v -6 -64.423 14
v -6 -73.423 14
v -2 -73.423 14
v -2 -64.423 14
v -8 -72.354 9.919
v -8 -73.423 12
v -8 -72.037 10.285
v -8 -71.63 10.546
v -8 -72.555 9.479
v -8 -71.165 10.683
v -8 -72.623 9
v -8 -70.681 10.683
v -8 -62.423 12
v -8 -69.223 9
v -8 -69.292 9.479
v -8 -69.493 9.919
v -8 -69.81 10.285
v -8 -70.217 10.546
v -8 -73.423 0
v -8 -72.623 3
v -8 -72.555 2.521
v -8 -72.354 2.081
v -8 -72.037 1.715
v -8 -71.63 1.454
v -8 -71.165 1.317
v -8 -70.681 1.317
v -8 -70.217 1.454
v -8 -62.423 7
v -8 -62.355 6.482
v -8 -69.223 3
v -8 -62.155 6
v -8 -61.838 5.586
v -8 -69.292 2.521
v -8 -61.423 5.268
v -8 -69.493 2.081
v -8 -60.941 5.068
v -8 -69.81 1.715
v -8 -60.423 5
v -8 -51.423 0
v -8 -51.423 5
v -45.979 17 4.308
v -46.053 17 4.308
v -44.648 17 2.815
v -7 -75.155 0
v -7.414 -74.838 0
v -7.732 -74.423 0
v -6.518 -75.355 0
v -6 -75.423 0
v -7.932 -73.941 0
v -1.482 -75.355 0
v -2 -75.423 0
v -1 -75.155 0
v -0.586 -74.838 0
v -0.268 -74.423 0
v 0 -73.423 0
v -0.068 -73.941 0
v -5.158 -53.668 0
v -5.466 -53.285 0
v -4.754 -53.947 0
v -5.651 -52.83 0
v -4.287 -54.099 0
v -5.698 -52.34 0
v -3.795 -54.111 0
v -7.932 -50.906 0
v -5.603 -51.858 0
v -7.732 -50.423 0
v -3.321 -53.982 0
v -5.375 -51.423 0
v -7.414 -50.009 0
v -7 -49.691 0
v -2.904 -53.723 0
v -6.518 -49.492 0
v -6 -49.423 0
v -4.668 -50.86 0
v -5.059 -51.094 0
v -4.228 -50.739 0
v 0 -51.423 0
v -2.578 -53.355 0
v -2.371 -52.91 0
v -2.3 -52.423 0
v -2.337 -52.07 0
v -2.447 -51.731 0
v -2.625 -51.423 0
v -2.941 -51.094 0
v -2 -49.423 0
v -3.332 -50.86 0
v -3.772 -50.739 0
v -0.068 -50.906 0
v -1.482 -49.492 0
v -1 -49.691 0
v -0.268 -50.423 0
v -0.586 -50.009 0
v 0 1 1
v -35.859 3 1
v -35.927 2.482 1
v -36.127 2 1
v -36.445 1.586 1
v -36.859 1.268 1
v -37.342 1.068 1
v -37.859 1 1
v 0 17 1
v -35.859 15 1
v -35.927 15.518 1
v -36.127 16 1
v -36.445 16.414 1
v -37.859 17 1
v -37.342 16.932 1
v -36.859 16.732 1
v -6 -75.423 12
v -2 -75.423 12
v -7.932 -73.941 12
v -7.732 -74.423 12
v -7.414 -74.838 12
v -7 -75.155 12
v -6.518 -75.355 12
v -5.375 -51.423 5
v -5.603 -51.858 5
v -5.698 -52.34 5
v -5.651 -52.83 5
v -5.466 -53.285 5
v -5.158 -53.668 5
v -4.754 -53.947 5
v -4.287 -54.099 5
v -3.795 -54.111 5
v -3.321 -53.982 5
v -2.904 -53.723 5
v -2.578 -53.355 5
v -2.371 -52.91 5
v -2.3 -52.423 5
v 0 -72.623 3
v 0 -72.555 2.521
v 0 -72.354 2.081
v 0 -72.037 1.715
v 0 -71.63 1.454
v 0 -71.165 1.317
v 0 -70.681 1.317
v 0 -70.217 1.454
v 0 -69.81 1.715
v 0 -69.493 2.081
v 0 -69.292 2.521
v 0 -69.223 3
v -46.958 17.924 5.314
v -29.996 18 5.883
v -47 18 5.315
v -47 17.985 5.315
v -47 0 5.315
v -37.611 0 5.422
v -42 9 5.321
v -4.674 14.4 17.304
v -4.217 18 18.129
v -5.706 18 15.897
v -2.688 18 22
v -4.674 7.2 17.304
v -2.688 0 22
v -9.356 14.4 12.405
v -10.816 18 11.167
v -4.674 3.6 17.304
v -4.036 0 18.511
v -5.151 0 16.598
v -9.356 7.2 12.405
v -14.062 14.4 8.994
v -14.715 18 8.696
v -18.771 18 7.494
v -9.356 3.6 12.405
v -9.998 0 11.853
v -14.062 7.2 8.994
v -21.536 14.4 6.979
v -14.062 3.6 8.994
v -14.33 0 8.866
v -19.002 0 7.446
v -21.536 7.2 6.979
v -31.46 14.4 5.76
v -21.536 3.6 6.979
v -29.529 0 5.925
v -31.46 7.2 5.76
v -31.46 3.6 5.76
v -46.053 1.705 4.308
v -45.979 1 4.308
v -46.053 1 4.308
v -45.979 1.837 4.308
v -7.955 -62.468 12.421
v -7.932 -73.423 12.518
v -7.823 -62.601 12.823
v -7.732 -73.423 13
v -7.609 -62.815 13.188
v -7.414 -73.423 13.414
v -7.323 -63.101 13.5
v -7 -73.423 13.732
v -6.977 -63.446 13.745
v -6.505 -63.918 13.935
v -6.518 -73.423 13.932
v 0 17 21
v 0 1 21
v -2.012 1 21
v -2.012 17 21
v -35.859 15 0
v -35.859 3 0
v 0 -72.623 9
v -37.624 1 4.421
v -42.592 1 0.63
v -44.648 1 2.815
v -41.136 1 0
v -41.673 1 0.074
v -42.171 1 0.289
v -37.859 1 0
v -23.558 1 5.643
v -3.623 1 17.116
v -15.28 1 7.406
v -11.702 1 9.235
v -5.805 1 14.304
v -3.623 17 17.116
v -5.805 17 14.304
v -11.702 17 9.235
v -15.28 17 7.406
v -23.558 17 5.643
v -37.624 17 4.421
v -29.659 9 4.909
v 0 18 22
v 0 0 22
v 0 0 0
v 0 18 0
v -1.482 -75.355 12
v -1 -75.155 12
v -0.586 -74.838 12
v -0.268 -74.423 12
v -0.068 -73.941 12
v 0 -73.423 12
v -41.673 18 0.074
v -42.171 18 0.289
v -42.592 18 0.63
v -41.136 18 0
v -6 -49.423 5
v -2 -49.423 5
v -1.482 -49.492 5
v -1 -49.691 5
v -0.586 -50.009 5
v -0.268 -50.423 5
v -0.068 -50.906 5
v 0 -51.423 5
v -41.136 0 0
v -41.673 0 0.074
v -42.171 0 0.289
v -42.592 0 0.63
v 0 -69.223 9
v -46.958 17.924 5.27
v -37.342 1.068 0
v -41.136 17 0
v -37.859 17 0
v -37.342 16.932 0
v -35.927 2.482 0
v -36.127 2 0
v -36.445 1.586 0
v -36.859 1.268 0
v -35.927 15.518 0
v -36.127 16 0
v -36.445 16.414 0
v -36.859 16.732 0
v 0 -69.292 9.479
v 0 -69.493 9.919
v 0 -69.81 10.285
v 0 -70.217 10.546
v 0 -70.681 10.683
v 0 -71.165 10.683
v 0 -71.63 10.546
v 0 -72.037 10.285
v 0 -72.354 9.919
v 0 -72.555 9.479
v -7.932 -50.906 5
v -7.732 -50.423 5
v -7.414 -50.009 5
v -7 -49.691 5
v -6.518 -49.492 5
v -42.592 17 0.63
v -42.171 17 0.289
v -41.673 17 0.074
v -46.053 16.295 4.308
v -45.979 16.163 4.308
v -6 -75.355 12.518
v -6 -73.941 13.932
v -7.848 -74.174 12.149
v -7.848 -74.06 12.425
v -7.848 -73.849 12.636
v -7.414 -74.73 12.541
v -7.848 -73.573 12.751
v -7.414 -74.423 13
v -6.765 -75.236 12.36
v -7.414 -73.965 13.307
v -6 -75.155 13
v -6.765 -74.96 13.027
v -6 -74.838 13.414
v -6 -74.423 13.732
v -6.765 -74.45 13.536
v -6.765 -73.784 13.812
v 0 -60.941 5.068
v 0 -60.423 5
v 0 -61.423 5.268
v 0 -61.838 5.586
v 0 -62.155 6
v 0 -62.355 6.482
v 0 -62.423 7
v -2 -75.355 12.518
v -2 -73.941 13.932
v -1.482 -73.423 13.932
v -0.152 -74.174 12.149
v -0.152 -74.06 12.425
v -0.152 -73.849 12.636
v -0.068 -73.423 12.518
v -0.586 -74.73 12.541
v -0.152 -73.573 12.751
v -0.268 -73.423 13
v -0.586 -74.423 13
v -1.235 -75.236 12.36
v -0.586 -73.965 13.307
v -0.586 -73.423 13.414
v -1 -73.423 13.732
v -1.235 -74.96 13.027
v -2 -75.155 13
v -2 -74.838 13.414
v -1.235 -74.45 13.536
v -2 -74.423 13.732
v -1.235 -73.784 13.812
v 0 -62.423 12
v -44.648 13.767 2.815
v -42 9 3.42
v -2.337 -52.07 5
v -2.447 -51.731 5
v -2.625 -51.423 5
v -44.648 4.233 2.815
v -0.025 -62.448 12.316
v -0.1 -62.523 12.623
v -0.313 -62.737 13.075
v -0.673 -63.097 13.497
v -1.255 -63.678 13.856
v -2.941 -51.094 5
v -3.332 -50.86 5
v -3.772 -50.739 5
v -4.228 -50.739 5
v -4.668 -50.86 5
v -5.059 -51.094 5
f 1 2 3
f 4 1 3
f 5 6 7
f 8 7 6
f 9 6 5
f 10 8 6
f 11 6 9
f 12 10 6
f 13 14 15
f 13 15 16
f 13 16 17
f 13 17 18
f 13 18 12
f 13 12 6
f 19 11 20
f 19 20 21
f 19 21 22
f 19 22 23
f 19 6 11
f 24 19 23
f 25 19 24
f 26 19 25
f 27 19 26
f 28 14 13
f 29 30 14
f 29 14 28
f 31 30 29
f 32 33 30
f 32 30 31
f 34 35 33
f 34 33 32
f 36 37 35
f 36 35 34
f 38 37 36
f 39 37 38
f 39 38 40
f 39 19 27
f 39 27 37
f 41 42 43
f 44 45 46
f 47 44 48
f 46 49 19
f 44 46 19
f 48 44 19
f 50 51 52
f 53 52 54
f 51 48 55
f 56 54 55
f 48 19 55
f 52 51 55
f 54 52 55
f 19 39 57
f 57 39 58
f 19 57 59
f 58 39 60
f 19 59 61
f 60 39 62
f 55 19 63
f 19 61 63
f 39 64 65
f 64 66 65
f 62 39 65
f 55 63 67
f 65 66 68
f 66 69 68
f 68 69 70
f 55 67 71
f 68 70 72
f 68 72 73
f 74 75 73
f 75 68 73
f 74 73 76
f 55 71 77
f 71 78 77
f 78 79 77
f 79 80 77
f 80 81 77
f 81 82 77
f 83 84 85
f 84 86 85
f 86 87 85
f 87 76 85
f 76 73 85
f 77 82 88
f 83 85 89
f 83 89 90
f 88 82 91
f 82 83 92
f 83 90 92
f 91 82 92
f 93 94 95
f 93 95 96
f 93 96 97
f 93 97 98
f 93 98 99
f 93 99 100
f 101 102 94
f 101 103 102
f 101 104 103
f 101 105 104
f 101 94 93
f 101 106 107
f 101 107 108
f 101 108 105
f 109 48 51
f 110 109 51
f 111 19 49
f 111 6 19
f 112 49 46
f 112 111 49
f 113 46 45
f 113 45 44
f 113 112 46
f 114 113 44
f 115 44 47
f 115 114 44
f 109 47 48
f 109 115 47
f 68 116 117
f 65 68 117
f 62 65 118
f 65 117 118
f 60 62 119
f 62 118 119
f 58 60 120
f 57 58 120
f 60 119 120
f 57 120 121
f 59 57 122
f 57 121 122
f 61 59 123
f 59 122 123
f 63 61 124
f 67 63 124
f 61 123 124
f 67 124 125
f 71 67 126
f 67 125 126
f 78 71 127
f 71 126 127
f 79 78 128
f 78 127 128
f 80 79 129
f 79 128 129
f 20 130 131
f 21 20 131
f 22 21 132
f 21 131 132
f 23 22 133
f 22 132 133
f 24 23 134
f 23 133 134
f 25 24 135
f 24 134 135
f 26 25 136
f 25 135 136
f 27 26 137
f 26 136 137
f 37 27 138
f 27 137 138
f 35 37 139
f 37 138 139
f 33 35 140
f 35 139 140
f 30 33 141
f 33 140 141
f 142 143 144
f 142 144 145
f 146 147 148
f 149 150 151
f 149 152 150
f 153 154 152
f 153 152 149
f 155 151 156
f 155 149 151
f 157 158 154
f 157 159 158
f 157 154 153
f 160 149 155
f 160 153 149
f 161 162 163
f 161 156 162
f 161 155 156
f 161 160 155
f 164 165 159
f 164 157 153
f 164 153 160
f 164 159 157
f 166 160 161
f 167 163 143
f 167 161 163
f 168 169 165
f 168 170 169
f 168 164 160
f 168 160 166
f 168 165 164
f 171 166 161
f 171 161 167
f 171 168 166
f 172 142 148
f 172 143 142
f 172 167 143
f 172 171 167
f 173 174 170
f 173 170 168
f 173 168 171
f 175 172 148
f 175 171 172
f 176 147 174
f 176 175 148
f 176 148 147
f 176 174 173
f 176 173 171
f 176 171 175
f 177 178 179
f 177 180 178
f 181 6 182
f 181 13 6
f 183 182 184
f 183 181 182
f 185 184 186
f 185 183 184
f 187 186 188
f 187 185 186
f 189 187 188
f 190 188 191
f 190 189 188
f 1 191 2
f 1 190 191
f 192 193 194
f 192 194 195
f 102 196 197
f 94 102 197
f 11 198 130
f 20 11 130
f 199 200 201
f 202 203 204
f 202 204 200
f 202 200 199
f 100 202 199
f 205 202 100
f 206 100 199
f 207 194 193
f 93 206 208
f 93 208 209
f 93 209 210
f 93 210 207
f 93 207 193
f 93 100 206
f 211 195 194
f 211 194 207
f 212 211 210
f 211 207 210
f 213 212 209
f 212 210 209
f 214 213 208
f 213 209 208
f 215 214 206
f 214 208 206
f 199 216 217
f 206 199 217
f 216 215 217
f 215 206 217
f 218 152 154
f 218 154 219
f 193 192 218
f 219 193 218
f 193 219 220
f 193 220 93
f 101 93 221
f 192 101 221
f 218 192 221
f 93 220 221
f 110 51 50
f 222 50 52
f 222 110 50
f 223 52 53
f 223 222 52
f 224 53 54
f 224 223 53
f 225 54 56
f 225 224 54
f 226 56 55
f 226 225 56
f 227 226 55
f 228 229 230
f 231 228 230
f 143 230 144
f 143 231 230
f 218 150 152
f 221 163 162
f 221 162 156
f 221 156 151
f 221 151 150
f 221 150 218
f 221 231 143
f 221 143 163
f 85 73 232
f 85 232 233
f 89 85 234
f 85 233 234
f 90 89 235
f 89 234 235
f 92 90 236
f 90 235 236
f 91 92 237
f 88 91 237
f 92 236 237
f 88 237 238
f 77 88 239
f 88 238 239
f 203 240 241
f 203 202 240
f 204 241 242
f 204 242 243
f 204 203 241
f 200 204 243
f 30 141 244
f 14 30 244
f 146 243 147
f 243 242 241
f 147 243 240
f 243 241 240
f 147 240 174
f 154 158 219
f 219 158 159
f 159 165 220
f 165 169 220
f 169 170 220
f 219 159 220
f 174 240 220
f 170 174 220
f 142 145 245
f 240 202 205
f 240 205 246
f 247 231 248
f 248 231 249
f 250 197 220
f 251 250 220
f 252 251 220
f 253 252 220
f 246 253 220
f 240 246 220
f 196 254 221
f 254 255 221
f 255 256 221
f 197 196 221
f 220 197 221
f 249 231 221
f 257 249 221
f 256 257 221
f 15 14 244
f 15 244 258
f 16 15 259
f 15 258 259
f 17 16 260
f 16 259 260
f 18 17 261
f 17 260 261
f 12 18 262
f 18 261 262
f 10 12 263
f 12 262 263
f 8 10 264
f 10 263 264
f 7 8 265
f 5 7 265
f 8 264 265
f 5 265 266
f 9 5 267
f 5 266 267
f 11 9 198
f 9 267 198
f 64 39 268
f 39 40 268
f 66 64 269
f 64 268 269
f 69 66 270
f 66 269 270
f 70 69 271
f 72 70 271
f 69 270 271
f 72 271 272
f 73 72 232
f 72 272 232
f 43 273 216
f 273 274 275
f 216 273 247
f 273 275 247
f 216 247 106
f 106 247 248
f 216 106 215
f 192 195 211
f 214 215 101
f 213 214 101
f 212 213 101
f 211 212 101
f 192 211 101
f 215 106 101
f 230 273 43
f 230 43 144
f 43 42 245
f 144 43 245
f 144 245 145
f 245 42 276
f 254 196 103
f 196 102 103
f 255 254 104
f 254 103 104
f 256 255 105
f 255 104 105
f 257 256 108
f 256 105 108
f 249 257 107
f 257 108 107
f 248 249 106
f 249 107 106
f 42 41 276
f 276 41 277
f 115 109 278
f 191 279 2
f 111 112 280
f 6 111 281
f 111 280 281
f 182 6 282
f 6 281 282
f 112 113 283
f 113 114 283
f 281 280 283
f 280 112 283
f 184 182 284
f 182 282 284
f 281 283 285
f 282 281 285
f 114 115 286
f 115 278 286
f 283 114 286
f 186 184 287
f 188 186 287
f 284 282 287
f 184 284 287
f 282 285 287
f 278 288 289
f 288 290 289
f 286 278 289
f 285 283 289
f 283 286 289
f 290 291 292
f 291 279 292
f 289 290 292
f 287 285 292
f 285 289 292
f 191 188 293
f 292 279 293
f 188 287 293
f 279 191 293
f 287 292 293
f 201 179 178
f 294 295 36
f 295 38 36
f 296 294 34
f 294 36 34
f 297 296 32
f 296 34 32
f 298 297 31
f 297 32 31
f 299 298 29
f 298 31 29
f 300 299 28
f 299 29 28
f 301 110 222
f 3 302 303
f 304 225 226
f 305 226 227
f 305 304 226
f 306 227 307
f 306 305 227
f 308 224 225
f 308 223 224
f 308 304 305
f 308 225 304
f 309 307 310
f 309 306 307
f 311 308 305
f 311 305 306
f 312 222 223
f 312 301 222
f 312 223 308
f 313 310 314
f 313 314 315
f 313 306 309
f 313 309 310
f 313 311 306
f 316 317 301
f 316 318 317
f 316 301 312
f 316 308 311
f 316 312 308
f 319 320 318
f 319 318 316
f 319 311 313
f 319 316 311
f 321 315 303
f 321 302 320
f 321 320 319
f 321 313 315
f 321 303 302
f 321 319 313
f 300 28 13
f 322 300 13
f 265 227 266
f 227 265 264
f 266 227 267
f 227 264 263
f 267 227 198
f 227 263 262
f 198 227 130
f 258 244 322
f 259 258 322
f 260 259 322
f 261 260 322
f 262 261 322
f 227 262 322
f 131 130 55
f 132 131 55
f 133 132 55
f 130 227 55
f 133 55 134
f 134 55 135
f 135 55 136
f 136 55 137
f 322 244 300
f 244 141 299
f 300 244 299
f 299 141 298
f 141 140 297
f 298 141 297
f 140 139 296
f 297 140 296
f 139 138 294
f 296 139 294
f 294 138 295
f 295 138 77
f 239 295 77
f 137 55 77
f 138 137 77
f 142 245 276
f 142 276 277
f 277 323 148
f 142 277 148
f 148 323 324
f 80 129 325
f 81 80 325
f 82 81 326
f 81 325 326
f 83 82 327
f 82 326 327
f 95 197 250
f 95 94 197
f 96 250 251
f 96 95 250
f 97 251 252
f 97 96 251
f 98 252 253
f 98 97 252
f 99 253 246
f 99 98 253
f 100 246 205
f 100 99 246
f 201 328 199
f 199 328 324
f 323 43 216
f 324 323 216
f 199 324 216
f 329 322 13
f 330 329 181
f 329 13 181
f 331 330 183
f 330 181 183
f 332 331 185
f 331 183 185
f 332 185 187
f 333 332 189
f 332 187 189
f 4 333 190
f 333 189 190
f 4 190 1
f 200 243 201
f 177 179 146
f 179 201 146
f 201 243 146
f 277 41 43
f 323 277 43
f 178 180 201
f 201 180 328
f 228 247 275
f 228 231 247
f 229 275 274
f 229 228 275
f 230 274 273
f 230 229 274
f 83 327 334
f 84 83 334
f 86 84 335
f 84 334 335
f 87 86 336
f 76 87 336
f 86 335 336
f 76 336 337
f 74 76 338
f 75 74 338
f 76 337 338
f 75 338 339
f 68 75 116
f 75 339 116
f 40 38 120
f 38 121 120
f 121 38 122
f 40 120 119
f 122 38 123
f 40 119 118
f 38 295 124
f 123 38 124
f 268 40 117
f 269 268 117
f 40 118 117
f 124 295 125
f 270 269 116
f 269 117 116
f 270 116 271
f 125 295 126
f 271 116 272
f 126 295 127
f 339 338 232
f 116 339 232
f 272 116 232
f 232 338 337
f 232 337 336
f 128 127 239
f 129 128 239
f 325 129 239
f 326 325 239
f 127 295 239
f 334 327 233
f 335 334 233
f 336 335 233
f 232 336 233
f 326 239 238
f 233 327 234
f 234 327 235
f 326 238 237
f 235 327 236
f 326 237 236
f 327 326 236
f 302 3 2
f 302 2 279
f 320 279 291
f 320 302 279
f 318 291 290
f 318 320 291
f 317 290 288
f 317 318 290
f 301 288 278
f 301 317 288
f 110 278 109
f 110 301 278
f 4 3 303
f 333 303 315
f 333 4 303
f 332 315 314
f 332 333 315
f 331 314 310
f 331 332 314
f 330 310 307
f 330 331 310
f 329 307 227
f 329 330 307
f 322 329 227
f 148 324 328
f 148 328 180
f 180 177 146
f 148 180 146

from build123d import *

# Parameters (mm, degrees)
F0_W      = 47
F0_H      = 18
F1_DEPTH  = 22
F4_DEPTH  = 25
F5_DEPTH  = 25
F7_T      = -1
F2_W      = 16
F2_H      = 20
F8_DEPTH  = 1
F9_W      = 8
F9_H      = 26
F10_DEPTH = 14
F11_W     = 13
F11_H     = 9
F12_DEPTH = 25
F13_R     = 2
F15_DEPTH = 25
F17_DEPTH = 25
F19_W     = 6.1407467425
F19_H     = 16
F20_DEPTH = 2
F21_R     = 2
F23_DEPTH = 16
F24_DEPTH = 25


# Not quite as in the source:
# - ends of sketch curves that miss each other by under 0.0002 mm in the source are joined


with BuildPart() as f1:
    # F0 (on Top) → F1 (new body)
    with BuildSketch(Plane.XY):
        with Locations((-23.5, 9)):
            Rectangle(F0_W, F0_H)
    extrude(amount=F1_DEPTH)

    # F3 (on face) → F4 (cut)
    with BuildSketch(Plane.XZ):
        with BuildLine():
            add(Edge.make_bspline(
                [(-2.6882688196, 22), (-3.2770454434, 20.6391466758), (-4.1784598757, 16.8748983141), (-9.4041486141, 12.3630724805), (-13.9335501605, 8.4565637973), (-23.0360767099, 6.5368633633), (-34.0870933489, 5.200595818), (-47, 5.3147859871)],
                knots=[0, 0, 0, 0, 0.1494824851, 0.3218138719, 0.4814084184, 0.6655862643, 1, 1, 1, 1], degree=3))
            Line((-2.6882688196, 22), (-47, 22))
            Line((-47, 22), (-47, 5.3147859871))
        make_face()
    extrude(amount=-F4_DEPTH, mode=Mode.SUBTRACT)

    # F3 (on face) → F5 (cut)
    with BuildSketch(Plane.XZ):
        Polygon((-42, 0), (-47, 5.3147859871), (-47, 0), align=None)
    extrude(amount=-F5_DEPTH, mode=Mode.SUBTRACT)

    # F7
    f7_openings = [f1.faces().sort_by_distance(p)[0] for p in [
        (-44.5, 9, 2.657393),
    ]]
    offset(amount=F7_T, openings=f7_openings, kind=Kind.INTERSECTION)

    # F2 (on face) → F8 (cut)
    with BuildSketch(Plane.YZ):
        with Locations((9, 11)):
            Rectangle(F2_W, F2_H)
    extrude(amount=-F8_DEPTH, mode=Mode.SUBTRACT)

    # F19 (on face) → F20 (cut)
    with BuildSketch(Plane(origin=(0, 0, 0), x_dir=(1, 0, 0), z_dir=(0, 0, -1))):
        with Locations((-38.9296266288, -9)):
            Rectangle(F19_W, F19_H)
        Polygon((-42, -1), (-42.6852083329, -1), (-43.1045070291, -1), (-43.1045070291, -17), (-42.6852083329, -17), (-42, -17), align=None)
    extrude(amount=-F20_DEPTH, mode=Mode.SUBTRACT)

    # F21
    f21_edges = [f1.edges().sort_by_distance(p)[0] for p in [
        (-35.859253, 17, 0.5),
        (-35.859253, 1, 0.5),
        (-42, 0.5, 0),
        (-42, 17.5, 0),
    ]]
    fillet(f21_edges, radius=F21_R)

    # F22 (on face) → F23 (join, through all)
    with BuildSketch(Plane.XZ.offset(-17)):
        with BuildLine():
            add(Edge.make_bspline(
                [(-45.979261035, 4.3077080456), (-45.9230921355, 4.3074304854), (-45.8669231813, 4.3071662313), (-45.8107541815, 4.3069151492), (-45.7545851445, 4.306677229), (-45.6984160781, 4.3064526573), (-45.6422469881, 4.3062418902), (-45.5860778784, 4.3060457258), (-44.541461727, 4.3026916555), (-43.5530151209, 4.3039144034), (-42.564580075, 4.309797802), (-41.5761785653, 4.3206346602), (-40.5878433409, 4.3367473036), (-39.599618044, 4.3584926715), (-38.61155733, 4.3862671393), (-37.6237268056, 4.4205065789)],
                knots=[0.1765693684, 0.1765693684, 0.1765693684, 0.1765693684, 0.1765693684, 0.1765693684, 0.1765693684, 0.1765693684, 0.1765693684, 0.1823209871, 0.1823209871, 0.1823209871, 0.1823209871, 0.1823209871, 0.1823209871, 0.1823209871, 0.2835362009, 0.2835362009, 0.2835362009, 0.2835362009, 0.2835362009, 0.2835362009, 0.2835362009, 0.2835362009, 0.2835362009], degree=8))
            Line((-45.979261035, 4.3077080456), (-44.6482196738, 2.8149441627))
            Line((-44.6482196738, 2.8149441627), (-37.6237268056, 4.4205065789))
        make_face()
    extrude(amount=F23_DEPTH)

    # F18 (on face) → F24 (cut)
    with BuildSketch(Plane(origin=(0, 0, 0), x_dir=(1, 0, 0), z_dir=(0, 0, -1))):
        Polygon((-47, -17.9847120319), (-46.9578729263, -17.9241712673), (-42, -9), (-47, 0), align=None)
    extrude(amount=-F24_DEPTH, mode=Mode.SUBTRACT)


with BuildPart() as f10:
    # F9 (on Top) → F10 (new body)
    with BuildSketch(Plane.XY):
        with Locations((-4, -62.4234300312)):
            Rectangle(F9_W, F9_H)
    extrude(amount=F10_DEPTH)

    # F11 (on face) → F12 (cut)
    with BuildSketch(Plane.YZ):
        with Locations((-55.9234300312, 9.5)):
            Rectangle(F11_W, F11_H)
    extrude(amount=-F12_DEPTH, mode=Mode.SUBTRACT)

    # F13
    f13_edges = [f10.edges().sort_by_distance(p)[0] for p in [
        (-4, -75.42343, 14),
        (-8, -75.42343, 7),
        (0, -75.42343, 7),
        (0, -68.92343, 14),
        (-8, -68.92343, 14),
        (-4, -62.42343, 5),
        (0, -49.42343, 2.5),
        (-8, -49.42343, 2.5),
        (-4, -62.42343, 14),
    ]]
    fillet(f13_edges, radius=F13_R)

    # F14 (on face) → F15 (cut)
    with BuildSketch(Plane.YZ):
        with BuildLine():
            ThreePointArc((-72.6234300312, 3), (-70.9234300312, 4.7), (-69.2234300312, 3))
            Line((-69.2234300312, 3), (-69.2234300312, 9))
            ThreePointArc((-69.2234300312, 9), (-70.9234300312, 7.3), (-72.6234300312, 9))
            Line((-72.6234300312, 9), (-72.6234300312, 3))
        make_face()
        with BuildLine():
            ThreePointArc((-72.6234300312, 9), (-70.9234300312, 7.3), (-69.2234300312, 9))
            ThreePointArc((-69.2234300312, 9), (-70.9234300312, 10.7), (-72.6234300312, 9))
        make_face()
        with BuildLine():
            ThreePointArc((-72.6234300312, 3), (-70.9234300312, 1.3), (-69.2234300312, 3))
            ThreePointArc((-69.2234300312, 3), (-70.9234300312, 4.7), (-72.6234300312, 3))
        make_face()
    extrude(amount=-F15_DEPTH, mode=Mode.SUBTRACT)

    # F16 (on face) → F17 (cut)
    with BuildSketch(Plane.XY.offset(5)):
        with BuildLine():
            Line((-2.6252272915, -51.4234300312), (-5.3747727085, -51.4234300312))
            ThreePointArc((-5.3747727085, -51.4234300312), (-4.5257786585, -54.0400799012), (-2.3, -52.4234300312))
            ThreePointArc((-2.3, -52.4234300312), (-2.38335013, -51.8976513726), (-2.6252272915, -51.4234300312))
        make_face()
        with BuildLine():
            ThreePointArc((-2.6252272915, -51.4234300312), (-4, -50.7234300312), (-5.3747727085, -51.4234300312))
            Line((-5.3747727085, -51.4234300312), (-2.6252272915, -51.4234300312))
        make_face()
    extrude(amount=-F17_DEPTH, mode=Mode.SUBTRACT)


solid = Compound([f1.part, f10.part])
